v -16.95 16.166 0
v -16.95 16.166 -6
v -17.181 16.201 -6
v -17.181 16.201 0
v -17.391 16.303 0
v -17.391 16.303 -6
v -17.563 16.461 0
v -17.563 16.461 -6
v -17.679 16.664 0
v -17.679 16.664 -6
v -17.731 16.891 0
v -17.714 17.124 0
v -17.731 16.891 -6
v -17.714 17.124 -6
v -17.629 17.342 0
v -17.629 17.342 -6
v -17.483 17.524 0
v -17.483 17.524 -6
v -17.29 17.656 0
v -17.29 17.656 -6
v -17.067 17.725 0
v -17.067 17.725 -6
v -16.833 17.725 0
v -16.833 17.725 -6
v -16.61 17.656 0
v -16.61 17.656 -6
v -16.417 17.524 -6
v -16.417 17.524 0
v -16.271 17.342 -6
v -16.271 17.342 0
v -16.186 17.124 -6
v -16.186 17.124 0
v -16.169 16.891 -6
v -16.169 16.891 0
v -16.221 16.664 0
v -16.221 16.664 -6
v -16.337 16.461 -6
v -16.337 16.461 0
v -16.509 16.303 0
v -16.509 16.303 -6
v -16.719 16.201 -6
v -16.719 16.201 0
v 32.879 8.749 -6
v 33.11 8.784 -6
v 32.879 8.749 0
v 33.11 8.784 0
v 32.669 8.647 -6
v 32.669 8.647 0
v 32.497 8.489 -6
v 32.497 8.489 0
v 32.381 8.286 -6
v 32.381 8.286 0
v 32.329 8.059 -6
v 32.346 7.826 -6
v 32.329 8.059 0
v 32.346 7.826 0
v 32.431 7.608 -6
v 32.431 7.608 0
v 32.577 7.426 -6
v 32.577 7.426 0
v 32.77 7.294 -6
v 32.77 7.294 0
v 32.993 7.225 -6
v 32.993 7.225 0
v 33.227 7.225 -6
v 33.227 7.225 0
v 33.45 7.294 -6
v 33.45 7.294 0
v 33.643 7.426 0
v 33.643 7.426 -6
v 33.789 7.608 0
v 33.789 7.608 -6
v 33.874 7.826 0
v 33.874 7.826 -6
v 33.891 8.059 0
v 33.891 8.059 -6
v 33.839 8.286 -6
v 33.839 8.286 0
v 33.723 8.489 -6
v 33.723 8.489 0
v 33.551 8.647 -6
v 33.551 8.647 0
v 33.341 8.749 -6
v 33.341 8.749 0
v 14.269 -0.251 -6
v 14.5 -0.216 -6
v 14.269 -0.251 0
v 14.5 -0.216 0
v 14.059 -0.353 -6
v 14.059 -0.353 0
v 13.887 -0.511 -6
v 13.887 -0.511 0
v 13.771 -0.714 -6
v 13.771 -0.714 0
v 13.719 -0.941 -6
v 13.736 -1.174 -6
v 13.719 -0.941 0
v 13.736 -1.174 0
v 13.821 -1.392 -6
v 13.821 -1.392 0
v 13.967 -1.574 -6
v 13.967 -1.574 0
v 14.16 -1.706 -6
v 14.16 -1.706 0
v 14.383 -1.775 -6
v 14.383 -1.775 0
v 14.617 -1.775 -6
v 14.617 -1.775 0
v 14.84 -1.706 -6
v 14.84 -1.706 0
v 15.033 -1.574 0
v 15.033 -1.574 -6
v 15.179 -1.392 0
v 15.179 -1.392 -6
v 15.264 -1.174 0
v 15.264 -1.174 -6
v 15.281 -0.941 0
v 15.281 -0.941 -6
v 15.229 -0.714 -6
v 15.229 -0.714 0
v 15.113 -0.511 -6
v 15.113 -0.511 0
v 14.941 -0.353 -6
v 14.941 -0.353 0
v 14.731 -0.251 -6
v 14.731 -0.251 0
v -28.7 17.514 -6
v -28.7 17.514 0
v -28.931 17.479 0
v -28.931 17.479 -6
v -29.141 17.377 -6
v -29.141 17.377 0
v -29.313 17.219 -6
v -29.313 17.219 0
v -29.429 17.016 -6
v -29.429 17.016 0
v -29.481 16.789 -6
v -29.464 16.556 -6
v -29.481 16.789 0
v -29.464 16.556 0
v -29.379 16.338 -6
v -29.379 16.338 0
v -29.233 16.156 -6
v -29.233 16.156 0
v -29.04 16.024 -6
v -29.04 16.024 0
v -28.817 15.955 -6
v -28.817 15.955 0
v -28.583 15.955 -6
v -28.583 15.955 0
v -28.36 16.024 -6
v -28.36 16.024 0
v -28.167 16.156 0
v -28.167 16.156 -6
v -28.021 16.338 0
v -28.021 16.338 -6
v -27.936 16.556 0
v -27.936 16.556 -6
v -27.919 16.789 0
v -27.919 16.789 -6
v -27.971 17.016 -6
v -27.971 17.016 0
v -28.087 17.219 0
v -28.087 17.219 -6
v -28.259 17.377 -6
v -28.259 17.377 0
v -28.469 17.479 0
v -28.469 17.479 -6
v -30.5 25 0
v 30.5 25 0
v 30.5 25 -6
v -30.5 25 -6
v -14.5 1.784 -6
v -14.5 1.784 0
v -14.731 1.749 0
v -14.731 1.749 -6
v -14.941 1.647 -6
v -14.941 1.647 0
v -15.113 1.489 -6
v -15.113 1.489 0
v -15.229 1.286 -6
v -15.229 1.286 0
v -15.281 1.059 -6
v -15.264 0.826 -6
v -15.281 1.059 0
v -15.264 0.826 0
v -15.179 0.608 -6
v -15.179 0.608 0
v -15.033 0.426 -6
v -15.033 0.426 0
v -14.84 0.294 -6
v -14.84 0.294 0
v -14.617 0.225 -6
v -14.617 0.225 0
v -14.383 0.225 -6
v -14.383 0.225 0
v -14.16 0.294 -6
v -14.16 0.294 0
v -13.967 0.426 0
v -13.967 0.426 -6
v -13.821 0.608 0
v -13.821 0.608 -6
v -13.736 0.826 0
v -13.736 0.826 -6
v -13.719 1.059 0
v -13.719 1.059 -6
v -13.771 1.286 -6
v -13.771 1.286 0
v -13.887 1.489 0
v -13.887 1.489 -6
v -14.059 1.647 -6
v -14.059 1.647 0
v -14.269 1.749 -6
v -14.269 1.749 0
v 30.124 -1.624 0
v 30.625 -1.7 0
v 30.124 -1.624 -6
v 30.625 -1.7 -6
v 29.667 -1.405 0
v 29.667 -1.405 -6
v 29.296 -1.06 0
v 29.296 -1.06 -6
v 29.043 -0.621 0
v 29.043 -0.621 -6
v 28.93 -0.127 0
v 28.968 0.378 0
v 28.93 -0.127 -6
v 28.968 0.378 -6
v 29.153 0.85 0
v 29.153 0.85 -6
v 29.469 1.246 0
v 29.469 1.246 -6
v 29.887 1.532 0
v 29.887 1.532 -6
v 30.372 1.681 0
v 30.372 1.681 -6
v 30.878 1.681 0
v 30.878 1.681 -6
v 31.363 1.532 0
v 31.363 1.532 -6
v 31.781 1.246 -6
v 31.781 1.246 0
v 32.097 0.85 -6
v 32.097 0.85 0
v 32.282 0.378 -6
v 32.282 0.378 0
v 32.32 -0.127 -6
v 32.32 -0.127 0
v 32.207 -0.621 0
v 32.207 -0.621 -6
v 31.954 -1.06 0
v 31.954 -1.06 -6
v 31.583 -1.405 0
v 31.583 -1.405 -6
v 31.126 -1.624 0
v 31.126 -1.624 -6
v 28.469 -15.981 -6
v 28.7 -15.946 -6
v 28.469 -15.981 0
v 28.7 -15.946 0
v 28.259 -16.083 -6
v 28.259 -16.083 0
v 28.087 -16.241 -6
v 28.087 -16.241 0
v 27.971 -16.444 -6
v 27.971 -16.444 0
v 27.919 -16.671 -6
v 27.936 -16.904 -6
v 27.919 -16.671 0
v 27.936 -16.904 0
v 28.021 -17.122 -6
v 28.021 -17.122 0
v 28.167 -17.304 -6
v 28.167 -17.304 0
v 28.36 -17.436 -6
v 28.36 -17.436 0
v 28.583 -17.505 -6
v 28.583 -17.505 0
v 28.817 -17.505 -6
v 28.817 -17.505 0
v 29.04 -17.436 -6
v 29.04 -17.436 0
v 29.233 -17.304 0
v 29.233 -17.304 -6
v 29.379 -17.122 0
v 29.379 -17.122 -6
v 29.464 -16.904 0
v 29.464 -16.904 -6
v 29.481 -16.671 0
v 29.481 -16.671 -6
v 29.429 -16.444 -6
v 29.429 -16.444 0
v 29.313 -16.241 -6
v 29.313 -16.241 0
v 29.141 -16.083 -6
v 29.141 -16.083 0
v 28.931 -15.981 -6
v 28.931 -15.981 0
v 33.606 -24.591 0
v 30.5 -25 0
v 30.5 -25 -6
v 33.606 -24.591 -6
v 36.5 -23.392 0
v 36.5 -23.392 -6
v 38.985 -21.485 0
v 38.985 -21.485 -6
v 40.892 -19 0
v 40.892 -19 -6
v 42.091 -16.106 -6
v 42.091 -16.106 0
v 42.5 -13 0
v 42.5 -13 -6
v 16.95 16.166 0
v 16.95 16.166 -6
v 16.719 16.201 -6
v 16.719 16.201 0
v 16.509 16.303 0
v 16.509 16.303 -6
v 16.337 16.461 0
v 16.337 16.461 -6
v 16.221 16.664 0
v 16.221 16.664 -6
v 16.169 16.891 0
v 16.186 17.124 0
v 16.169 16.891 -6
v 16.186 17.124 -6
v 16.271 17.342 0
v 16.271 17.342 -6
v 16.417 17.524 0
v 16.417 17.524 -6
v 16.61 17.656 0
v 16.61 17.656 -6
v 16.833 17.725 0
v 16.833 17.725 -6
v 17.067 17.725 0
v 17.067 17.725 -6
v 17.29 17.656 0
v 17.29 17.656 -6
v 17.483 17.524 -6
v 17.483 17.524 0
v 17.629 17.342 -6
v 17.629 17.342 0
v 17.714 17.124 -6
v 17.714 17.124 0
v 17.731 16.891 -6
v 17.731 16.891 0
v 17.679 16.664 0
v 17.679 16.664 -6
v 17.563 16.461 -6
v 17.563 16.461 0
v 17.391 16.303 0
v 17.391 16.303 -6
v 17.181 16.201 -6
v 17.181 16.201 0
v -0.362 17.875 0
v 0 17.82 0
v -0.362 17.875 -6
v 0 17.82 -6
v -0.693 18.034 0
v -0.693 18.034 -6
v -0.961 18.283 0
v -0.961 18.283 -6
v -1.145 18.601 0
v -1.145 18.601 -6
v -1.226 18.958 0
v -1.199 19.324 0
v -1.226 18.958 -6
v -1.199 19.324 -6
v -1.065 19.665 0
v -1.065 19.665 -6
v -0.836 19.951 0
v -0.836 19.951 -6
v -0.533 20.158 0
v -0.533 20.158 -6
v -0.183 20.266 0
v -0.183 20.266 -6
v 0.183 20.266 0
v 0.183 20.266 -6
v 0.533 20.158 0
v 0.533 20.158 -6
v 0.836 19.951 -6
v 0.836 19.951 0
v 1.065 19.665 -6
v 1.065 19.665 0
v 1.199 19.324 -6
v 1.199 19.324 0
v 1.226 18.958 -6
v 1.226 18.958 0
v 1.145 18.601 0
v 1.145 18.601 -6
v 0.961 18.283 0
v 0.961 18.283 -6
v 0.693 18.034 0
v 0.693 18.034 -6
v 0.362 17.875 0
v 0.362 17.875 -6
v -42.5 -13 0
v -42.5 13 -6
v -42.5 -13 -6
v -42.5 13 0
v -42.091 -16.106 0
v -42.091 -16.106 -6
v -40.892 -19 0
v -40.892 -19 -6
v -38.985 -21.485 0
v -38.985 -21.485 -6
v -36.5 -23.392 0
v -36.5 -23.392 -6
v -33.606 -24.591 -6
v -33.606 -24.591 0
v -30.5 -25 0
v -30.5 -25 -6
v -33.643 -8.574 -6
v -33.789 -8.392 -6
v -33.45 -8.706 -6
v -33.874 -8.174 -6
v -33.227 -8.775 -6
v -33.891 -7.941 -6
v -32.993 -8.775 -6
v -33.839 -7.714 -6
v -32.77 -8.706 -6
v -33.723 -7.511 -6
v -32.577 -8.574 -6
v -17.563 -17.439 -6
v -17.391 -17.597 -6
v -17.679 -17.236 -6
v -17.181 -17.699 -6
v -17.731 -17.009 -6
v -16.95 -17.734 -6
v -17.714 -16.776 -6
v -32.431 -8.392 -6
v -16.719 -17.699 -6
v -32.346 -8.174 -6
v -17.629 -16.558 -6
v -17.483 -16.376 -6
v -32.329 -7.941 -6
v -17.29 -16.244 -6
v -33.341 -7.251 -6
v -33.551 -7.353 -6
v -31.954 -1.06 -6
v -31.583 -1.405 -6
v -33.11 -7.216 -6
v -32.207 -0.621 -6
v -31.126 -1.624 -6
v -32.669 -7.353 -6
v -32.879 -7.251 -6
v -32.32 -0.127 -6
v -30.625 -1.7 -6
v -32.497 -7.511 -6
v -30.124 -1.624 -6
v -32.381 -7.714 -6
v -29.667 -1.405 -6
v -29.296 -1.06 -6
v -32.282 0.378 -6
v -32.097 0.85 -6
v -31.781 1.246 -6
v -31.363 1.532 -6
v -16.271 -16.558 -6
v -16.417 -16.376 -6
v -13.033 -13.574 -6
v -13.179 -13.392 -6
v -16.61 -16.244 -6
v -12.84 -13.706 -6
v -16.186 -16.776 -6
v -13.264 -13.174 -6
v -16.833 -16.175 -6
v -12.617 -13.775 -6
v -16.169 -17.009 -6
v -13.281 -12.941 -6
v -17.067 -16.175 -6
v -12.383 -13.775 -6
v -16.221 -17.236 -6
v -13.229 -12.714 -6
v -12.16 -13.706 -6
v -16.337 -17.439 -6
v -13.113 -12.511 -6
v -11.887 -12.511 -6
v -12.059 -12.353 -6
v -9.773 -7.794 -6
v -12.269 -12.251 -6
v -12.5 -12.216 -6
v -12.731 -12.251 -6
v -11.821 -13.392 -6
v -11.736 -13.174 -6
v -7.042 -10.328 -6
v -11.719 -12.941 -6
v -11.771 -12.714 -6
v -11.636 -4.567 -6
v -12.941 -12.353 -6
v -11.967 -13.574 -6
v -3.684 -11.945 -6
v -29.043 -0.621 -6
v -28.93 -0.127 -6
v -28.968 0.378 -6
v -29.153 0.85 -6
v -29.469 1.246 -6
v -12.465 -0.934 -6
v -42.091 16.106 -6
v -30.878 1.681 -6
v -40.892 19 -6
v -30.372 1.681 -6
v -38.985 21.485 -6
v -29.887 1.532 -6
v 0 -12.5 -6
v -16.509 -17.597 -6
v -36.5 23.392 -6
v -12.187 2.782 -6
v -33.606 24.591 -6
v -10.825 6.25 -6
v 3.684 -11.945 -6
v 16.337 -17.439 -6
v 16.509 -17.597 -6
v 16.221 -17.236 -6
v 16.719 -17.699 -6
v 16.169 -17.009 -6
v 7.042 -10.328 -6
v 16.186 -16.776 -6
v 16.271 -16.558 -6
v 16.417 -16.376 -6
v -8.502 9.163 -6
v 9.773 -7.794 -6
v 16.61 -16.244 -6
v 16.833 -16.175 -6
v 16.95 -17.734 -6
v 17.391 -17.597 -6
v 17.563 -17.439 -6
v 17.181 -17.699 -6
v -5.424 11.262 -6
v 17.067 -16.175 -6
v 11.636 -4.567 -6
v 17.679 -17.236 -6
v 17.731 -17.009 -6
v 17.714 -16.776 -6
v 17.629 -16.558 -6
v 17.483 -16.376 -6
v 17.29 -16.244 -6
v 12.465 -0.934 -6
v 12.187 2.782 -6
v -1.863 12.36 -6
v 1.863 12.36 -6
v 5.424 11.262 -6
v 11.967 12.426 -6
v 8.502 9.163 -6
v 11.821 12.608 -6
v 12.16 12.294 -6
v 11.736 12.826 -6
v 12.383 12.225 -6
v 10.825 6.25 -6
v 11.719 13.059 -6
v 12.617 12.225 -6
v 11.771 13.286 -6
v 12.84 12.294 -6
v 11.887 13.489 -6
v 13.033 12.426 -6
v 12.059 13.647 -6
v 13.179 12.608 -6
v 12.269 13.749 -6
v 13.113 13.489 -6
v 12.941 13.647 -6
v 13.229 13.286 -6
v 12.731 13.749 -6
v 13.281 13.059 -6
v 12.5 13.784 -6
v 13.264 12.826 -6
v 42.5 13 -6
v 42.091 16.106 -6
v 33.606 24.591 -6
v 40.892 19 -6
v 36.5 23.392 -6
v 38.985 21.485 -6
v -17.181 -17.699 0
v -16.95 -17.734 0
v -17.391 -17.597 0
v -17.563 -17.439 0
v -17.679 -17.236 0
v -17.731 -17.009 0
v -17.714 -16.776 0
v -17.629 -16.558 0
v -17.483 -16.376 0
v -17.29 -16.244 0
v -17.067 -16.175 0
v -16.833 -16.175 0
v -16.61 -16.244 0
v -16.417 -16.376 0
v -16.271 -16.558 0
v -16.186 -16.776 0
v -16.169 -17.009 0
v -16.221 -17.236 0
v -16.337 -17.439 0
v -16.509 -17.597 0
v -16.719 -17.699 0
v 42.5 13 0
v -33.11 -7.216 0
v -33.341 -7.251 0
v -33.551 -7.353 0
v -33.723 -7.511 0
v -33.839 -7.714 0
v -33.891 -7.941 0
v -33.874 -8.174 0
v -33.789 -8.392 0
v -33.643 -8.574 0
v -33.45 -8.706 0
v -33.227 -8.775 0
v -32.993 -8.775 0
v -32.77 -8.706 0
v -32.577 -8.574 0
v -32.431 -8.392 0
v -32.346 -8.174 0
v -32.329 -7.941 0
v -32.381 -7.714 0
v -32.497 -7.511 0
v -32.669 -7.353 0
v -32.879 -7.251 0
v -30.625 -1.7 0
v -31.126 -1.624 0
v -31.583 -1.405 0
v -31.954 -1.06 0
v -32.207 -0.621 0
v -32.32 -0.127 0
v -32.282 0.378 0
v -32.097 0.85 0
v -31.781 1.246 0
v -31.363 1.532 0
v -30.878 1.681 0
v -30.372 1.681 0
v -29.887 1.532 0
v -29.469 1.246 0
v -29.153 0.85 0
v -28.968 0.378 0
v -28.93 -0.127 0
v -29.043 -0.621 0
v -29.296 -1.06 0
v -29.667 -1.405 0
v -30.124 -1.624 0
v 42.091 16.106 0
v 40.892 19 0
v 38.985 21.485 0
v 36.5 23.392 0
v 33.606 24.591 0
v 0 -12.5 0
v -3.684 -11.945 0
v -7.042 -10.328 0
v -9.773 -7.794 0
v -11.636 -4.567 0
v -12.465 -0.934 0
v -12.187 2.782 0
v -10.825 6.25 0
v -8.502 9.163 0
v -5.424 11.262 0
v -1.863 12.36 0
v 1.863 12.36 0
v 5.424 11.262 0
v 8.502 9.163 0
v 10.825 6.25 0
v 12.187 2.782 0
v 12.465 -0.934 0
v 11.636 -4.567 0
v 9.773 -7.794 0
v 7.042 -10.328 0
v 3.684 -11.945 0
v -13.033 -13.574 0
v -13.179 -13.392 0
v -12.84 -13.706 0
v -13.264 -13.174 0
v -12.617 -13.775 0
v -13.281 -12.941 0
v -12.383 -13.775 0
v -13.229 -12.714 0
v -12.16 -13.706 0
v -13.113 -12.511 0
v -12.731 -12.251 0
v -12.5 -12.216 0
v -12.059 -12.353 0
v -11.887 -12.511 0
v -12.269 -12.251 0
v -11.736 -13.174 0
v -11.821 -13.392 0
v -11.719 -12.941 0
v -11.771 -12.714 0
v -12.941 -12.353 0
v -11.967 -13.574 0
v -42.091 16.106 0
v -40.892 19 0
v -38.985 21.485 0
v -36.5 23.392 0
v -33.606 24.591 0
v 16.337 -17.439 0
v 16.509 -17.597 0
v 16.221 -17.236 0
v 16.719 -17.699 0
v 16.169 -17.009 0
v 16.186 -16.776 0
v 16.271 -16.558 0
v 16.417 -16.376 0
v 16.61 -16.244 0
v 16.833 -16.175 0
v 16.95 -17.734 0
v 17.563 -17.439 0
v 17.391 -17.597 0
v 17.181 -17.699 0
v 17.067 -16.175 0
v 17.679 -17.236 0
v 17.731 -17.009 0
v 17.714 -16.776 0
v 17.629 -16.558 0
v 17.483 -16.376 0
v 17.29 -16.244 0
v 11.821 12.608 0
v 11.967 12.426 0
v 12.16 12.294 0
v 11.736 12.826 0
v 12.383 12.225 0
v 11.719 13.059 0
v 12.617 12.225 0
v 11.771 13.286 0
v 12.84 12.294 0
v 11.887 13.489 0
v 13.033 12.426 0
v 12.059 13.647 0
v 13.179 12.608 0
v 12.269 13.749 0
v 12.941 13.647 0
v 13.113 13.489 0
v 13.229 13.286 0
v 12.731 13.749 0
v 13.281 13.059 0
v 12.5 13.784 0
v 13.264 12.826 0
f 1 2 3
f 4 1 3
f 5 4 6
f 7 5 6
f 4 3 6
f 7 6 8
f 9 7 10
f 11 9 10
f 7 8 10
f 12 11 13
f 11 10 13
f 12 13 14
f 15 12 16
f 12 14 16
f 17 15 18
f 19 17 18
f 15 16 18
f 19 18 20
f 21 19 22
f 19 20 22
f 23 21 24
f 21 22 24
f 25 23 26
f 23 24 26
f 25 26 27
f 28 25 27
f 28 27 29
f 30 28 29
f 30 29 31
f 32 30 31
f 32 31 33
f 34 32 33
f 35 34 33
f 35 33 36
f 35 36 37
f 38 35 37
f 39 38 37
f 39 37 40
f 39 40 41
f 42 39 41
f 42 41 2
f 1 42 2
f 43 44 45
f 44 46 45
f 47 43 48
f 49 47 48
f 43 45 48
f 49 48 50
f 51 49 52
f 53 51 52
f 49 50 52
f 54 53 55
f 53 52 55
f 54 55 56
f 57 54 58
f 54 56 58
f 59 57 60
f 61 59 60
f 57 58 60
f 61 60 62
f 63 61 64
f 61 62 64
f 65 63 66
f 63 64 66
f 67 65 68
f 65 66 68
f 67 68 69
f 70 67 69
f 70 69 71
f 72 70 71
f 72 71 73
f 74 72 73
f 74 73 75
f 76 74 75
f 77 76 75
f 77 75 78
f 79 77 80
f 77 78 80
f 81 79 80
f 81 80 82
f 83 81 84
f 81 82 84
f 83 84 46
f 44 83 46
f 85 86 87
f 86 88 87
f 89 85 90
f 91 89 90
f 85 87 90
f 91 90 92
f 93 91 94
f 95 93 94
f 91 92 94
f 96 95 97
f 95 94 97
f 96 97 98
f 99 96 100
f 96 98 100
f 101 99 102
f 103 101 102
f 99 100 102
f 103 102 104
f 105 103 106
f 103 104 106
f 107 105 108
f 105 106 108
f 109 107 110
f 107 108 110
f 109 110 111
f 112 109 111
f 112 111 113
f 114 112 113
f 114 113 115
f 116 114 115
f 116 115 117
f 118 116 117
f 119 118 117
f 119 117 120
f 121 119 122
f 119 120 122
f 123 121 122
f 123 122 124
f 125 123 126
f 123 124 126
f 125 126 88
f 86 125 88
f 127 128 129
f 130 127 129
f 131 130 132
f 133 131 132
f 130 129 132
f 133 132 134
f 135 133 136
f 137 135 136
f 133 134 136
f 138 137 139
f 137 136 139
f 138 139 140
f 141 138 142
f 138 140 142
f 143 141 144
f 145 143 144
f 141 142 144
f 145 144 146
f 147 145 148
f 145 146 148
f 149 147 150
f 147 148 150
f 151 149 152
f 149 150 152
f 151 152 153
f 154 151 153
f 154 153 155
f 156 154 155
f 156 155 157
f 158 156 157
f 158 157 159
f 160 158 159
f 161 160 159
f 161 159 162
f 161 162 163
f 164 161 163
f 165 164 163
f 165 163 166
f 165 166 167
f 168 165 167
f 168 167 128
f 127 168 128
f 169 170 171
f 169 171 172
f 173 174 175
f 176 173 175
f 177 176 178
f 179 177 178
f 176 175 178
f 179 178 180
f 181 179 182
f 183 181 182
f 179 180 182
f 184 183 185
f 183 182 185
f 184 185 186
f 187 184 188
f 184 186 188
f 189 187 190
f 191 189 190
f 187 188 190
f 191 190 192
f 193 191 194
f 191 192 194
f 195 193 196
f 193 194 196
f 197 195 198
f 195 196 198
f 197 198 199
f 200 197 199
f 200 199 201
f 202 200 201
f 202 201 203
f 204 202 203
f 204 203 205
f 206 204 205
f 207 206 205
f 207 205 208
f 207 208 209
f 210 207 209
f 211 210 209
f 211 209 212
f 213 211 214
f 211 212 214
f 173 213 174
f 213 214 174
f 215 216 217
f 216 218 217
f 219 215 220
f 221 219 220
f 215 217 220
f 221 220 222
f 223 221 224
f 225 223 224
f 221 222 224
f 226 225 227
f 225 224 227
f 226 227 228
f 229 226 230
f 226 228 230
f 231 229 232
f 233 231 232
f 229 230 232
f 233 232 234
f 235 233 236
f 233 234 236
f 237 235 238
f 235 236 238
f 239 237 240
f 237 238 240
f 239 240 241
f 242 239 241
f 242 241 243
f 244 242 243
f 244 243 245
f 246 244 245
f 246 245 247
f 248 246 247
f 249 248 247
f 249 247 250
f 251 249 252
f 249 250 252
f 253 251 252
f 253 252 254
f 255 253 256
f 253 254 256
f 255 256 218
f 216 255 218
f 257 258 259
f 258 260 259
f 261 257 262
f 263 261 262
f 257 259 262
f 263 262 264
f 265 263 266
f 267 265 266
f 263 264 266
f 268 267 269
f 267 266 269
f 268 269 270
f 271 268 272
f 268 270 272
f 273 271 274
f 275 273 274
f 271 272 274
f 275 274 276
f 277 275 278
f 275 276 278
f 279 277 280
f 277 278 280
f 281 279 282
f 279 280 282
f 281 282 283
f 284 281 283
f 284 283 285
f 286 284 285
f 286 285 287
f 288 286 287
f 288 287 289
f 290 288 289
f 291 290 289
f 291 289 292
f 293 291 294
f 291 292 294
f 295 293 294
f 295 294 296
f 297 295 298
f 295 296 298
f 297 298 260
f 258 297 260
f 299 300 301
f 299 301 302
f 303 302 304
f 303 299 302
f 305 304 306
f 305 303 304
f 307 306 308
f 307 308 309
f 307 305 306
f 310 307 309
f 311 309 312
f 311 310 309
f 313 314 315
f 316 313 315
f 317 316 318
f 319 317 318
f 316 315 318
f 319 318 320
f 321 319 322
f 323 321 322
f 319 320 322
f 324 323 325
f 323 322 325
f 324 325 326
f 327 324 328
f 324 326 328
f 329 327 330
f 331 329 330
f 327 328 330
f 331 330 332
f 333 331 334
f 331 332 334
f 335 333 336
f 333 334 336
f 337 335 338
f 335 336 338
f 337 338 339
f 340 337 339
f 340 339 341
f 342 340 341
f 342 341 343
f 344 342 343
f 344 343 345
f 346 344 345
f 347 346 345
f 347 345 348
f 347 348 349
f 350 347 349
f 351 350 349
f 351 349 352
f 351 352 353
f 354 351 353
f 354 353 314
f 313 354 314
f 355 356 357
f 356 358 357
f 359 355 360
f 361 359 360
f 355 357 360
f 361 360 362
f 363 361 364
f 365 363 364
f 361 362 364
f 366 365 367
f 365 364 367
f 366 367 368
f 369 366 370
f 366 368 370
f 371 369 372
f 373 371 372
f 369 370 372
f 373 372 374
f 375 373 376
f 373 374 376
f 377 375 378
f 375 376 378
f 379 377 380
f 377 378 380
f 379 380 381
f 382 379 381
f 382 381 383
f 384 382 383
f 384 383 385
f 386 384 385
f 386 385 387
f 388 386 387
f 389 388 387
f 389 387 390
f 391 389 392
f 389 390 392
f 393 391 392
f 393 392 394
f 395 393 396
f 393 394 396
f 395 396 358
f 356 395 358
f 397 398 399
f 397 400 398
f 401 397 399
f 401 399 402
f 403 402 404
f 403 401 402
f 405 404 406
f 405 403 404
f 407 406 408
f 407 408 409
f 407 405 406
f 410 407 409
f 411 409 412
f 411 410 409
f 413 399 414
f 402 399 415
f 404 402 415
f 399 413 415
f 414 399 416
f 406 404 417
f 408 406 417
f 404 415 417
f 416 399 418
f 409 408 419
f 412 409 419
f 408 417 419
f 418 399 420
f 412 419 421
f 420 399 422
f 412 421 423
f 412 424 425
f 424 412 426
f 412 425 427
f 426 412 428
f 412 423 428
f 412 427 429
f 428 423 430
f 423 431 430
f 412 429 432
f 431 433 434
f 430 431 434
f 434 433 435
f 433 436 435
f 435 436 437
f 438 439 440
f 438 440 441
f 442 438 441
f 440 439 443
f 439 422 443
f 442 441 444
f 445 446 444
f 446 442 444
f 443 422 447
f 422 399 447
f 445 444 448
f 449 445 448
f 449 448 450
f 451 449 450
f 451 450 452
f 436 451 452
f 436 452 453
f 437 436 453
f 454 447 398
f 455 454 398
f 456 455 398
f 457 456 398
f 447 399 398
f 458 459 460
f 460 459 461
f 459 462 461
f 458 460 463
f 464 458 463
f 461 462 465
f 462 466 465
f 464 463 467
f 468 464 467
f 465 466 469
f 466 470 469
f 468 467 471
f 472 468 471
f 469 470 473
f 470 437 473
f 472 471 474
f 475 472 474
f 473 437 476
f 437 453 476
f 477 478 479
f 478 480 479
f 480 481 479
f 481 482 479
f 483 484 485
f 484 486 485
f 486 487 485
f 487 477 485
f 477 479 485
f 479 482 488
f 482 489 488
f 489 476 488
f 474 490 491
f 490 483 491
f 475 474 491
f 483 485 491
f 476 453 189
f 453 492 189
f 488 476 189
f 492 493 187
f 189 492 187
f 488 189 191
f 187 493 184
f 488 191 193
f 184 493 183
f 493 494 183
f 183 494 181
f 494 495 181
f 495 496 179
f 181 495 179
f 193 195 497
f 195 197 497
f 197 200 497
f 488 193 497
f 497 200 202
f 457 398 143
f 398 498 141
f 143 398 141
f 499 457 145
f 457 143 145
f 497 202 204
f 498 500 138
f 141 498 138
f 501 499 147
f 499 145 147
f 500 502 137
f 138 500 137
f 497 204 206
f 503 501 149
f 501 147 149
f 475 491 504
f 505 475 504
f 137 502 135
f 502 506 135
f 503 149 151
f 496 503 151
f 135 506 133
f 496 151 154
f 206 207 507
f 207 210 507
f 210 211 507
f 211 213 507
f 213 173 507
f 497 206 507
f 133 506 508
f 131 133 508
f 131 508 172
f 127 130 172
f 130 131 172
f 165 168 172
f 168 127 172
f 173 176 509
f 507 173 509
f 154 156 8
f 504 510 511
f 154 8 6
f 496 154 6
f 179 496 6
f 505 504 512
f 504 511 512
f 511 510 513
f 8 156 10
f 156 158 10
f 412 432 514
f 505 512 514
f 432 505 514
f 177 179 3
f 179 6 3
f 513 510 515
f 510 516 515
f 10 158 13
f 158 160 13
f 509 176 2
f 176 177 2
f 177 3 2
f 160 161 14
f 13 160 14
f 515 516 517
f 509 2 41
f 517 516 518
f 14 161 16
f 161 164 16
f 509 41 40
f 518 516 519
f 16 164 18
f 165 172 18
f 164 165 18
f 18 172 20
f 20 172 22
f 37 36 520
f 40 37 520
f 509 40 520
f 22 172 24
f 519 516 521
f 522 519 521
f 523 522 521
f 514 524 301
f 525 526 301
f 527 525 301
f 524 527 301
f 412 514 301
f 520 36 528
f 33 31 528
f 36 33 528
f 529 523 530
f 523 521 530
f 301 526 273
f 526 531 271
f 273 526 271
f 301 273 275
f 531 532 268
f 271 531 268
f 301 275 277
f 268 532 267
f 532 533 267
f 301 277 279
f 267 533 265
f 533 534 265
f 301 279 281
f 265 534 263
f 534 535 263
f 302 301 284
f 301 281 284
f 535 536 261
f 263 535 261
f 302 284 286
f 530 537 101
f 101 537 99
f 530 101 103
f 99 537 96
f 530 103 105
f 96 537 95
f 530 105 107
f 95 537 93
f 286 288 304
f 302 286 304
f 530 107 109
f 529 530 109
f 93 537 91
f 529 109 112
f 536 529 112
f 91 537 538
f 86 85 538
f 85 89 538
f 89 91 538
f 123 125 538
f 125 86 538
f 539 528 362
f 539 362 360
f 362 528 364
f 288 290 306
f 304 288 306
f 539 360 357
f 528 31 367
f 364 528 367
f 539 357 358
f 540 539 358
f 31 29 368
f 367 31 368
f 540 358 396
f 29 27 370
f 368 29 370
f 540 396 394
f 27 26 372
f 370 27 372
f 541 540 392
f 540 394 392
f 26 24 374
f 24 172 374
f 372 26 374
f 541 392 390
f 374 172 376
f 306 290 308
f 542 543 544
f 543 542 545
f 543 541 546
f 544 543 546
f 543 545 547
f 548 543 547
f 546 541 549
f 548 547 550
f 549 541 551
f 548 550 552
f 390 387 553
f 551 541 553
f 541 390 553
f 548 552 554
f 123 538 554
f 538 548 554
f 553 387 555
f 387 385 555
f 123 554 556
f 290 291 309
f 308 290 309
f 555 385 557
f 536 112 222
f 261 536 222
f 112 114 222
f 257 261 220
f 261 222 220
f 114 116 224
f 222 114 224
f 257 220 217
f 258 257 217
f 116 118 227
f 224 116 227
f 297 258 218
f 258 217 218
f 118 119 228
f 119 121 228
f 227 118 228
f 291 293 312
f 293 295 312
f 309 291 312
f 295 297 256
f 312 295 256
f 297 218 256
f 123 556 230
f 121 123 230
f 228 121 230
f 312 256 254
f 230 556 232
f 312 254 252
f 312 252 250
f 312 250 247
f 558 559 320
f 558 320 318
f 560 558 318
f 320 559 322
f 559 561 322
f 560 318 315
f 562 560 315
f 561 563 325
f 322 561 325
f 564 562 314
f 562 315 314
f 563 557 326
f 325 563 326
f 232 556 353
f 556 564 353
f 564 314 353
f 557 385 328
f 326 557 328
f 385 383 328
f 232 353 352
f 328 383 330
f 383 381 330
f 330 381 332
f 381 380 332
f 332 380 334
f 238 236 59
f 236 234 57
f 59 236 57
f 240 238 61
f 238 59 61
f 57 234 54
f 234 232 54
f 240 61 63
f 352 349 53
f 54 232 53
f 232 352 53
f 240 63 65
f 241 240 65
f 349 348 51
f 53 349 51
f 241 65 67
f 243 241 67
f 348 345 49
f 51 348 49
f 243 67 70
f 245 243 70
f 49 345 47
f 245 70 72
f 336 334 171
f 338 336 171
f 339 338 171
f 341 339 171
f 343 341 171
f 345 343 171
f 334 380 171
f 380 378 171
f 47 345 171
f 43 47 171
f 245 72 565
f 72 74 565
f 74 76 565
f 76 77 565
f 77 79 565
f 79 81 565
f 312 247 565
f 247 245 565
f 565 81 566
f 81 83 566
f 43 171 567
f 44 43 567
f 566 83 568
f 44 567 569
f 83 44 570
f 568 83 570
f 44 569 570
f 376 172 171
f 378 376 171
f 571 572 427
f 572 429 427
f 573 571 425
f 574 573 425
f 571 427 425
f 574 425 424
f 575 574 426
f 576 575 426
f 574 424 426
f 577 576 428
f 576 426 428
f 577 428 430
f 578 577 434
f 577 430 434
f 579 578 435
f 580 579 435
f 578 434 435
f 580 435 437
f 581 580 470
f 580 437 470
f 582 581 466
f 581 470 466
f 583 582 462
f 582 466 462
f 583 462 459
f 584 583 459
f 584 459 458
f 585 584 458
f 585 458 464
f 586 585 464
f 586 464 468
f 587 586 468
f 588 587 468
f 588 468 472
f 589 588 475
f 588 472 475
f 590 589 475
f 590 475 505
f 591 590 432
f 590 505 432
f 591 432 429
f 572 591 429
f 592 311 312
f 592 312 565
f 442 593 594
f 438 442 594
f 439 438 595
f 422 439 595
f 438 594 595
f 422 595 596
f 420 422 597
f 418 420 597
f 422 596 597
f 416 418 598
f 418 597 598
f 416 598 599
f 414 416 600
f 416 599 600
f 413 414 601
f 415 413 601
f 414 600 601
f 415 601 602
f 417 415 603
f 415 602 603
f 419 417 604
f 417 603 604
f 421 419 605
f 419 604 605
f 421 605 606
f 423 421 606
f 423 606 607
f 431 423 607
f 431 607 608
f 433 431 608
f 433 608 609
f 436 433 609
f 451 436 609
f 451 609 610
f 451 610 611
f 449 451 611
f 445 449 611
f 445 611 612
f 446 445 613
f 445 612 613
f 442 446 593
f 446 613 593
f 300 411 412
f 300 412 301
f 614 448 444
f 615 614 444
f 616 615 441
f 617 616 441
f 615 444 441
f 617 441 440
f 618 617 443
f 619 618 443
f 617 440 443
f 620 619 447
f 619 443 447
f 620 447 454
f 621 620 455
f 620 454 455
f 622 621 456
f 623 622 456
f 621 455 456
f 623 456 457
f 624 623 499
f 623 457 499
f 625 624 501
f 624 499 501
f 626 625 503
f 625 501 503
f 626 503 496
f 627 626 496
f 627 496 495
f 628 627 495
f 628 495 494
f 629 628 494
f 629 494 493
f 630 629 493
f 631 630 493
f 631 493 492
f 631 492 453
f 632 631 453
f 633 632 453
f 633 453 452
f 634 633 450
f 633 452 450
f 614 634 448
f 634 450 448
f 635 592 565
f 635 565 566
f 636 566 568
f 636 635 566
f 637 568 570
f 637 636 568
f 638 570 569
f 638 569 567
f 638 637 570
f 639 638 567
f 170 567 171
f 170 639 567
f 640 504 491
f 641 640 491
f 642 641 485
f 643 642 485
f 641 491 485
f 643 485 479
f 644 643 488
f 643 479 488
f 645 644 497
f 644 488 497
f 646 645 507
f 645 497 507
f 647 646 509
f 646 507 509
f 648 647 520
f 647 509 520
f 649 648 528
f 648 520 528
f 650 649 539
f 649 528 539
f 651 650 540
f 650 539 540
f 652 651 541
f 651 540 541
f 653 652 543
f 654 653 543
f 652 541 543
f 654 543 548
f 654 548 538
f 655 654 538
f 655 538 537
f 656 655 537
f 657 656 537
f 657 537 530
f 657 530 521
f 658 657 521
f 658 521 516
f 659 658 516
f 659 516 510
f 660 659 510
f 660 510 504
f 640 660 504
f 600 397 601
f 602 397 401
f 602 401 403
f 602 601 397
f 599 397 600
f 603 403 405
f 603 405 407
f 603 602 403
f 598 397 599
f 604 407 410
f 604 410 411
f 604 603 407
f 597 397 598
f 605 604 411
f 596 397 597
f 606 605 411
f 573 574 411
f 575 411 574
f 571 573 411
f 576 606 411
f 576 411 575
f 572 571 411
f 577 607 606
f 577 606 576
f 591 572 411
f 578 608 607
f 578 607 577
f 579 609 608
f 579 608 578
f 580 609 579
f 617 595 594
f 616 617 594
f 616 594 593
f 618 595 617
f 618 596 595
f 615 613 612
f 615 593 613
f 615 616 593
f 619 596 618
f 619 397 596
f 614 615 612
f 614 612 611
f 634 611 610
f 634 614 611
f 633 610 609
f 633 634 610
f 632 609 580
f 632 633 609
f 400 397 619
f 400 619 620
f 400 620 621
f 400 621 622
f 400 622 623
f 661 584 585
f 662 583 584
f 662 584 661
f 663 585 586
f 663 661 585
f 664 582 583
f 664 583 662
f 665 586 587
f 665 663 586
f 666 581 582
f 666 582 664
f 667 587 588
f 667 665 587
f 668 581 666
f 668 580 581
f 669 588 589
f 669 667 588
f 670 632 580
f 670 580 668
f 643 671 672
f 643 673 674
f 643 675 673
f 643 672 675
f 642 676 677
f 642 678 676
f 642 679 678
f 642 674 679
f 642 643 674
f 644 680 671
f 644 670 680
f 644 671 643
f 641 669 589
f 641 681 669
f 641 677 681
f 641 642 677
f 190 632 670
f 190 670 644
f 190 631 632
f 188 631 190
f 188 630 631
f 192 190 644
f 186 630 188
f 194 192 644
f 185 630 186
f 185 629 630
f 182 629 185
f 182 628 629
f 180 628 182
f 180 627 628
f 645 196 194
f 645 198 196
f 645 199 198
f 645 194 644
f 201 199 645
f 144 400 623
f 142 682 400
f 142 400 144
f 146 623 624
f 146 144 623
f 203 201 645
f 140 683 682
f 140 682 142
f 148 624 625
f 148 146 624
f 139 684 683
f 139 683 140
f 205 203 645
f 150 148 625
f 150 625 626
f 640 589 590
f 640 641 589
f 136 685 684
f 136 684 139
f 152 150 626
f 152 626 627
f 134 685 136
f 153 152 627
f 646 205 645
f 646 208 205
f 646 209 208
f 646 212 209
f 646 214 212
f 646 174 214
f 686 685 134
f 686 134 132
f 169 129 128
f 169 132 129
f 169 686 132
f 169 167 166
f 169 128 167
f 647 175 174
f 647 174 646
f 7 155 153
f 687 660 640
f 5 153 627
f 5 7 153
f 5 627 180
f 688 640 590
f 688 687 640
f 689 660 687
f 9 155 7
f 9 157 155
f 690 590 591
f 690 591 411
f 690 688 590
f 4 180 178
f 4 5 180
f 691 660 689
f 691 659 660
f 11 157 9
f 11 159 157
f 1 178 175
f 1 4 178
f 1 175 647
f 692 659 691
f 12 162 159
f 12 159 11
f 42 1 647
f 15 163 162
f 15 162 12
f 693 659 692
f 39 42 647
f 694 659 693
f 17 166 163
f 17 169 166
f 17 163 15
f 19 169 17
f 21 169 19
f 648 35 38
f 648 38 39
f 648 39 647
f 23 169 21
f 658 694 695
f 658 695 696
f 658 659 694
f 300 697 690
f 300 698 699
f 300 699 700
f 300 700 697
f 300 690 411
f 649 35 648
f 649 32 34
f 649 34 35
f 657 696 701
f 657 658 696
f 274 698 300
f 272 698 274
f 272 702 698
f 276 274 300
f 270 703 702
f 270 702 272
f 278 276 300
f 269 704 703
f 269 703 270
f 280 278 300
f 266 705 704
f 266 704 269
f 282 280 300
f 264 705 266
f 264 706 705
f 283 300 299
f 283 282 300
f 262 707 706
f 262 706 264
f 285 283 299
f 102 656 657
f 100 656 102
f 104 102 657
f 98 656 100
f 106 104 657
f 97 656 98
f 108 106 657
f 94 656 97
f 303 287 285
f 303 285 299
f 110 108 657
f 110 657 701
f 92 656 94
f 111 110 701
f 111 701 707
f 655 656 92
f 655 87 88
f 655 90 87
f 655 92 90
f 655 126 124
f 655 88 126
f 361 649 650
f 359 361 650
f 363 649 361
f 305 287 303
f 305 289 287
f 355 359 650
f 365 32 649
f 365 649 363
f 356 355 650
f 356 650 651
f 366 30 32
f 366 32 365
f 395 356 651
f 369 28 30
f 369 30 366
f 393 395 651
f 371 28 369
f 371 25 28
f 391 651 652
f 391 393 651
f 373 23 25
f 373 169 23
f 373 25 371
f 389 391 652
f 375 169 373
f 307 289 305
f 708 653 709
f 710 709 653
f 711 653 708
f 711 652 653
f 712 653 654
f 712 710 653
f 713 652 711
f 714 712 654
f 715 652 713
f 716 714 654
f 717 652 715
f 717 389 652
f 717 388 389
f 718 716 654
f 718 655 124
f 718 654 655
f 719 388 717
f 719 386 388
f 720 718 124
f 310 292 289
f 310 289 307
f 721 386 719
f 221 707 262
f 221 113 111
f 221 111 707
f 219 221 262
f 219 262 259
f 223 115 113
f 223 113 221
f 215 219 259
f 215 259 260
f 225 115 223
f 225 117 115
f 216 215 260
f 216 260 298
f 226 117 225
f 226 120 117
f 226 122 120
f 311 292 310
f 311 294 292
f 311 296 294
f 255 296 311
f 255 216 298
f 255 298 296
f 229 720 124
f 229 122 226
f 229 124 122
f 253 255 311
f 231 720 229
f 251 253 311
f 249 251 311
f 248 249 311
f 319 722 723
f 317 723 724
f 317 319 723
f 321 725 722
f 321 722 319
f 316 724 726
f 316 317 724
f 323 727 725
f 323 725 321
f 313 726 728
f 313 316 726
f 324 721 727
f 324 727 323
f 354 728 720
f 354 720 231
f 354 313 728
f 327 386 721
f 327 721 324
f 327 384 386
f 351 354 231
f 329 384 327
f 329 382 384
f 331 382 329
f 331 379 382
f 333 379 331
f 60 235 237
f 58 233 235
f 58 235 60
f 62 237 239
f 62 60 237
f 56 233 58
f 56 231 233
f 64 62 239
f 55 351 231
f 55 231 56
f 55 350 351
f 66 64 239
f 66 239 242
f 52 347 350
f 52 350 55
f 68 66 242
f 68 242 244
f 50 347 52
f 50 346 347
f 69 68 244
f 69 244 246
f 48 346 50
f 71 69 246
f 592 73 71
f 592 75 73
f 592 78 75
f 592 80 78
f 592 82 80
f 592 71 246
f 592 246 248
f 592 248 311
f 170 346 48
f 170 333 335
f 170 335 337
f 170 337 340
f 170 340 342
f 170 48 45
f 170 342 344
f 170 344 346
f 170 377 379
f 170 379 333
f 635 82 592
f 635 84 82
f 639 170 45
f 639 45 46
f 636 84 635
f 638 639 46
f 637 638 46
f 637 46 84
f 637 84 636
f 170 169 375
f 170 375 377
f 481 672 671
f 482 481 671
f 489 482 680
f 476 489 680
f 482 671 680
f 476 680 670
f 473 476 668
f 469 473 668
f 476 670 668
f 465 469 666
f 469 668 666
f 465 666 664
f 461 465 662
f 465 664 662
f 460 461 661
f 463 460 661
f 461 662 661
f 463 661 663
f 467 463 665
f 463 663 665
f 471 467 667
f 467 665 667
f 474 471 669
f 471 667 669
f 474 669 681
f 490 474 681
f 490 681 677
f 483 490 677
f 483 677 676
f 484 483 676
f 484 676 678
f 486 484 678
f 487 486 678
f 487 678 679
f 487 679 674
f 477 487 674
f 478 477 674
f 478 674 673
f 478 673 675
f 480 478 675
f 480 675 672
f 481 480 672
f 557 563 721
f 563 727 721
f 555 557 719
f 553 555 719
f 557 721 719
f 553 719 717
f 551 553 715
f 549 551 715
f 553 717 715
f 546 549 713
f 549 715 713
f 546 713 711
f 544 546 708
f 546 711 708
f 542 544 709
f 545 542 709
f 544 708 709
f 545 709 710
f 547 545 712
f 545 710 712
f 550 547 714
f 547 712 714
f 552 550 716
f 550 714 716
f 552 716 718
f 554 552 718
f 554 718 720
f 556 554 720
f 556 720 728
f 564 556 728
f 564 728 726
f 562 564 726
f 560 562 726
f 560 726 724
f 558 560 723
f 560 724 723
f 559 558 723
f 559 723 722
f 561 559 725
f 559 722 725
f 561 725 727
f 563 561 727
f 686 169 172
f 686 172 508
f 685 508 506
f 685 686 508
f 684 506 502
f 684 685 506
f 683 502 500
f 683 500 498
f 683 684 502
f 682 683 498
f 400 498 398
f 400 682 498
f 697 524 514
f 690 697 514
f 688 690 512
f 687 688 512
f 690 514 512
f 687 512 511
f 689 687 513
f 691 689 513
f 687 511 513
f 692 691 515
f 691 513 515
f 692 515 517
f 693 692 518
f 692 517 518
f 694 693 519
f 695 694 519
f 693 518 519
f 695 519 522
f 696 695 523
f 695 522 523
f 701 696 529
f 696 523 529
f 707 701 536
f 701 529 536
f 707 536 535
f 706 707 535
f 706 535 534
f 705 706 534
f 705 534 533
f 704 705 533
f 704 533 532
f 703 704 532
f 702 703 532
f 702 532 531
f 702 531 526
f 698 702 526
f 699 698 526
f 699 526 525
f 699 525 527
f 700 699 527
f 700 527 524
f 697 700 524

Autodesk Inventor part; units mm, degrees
ref_plane "YZ Plane" through (0, 0, 0) normal (1, 0, 0) x (0, 1, 0)
ref_plane "XZ Plane" through (0, 0, 0) normal (0, 1, 0) x (-1, 0, 0)
ref_plane "XY Plane" through (0, 0, 0) normal (0, 0, 1) x (1, 0, 0)
sketch "Sketch1" plane through (0, 0, 0) normal (0, 0, 1) x (1, 0, 0)
  line L0 (-30.5, -25) -> (30.5, -25)
  line L1 (42.5, -13) -> (42.5, 13)
  line L2 (30.5, 25) -> (-30.5, 25)
  line L3 (-42.5, 13) -> (-42.5, -13)
  line L4 (-42.5, -25) -> (42.5, 25) construction
  line L5 (42.5, -25) -> (-42.5, 25) construction
  arc A0 (-30.5, 25) -> (-42.5, 13) centre (-30.5, 13) ccw
  arc A1 (-42.5, -13) -> (-30.5, -25) centre (-30.5, -13) ccw
  arc A2 (30.5, -25) -> (42.5, -13) centre (30.5, -13) ccw
  arc A3 (42.5, 13) -> (30.5, 25) centre (30.5, 13) ccw
  line L6 (-19.05, -19.05) -> (19.05, -19.05)
  line L7 (19.05, -19.05) -> (19.05, 19.05)
  line L8 (19.05, 19.05) -> (-19.05, 19.05)
  line L9 (-19.05, 19.05) -> (-19.05, -19.05)
  line L10 (-19.05, -19.05) -> (19.05, 19.05) construction
  line L11 (19.05, -19.05) -> (-19.05, 19.05) construction
  circle A4 centre (0, 0) radius 12.5
  line L12 (-19.05, 19.05) -> (-16.95, 19.05)
  line L13 (-16.95, 19.05) -> (-16.95, 16.95)
  circle A5 centre (-16.95, 16.95) radius 2.25
  line L14 (19.05, 19.05) -> (16.95, 19.05)
  line L15 (16.95, 19.05) -> (16.95, 16.95)
  line L16 (-19.05, -19.05) -> (-16.95, -19.05)
  line L17 (-16.95, -19.05) -> (-16.95, -16.95)
  line L18 (19.05, -19.05) -> (16.95, -19.05)
  line L19 (16.95, -19.05) -> (16.95, -16.95)
  circle A6 centre (16.95, 16.95) radius 2.25
  circle A7 centre (-16.95, -16.95) radius 2.25
  circle A8 centre (16.95, -16.95) radius 2.25
  line L20 (0, 0) -> (30.625, 0)
  line L21 (0, 0) -> (-30.625, 0)
  circle A9 centre (-30.625, 0) radius 3.2
  circle A10 centre (30.625, 0) radius 3.2
  circle A11 centre (0, 19.05) radius 2.85
  dimension "d0" = 85
  dimension "d1" = 50
  dimension "d2" = 12
  dimension "d3" = 38.1
  dimension "d4" = 38.1
  dimension "d5" = 25
  dimension "d6" = 2.1
  dimension "d7" = 2.1
  dimension "d8" = 4.5
  dimension "d9" = 2.1
  dimension "d10" = 2.1
  dimension "d11" = 2.1
  dimension "d12" = 2.1
  dimension "d13" = 2.1
  dimension "d14" = 2.1
  dimension "d15" = 4.5
  dimension "d16" = 4.5
  dimension "d17" = 4.5
  dimension "d18" = 30.625
  dimension "d19" = 30.625
  dimension "d20" = 6.4
  dimension "d21" = 6.4
  dimension "d22" = 5.7
extrude "Extrusion1" add sketch "Sketch1" against normal blind 6 contours A1 L3 A0 L2 A3 L1 A2 L0 | L9 A7 L6 | A9 | A10 | A7 L9 L6 | L6 A7 | A7 L9 | A7 L9 L21 A4 L20 L7 A8 L6 | A8 L7 L6 | L6 A8 | L9 A5 L8 A11 A6 L7 L20 A4 L21 | A8 L7 | A8 L7 L6 | A5 L9 | L9 A5 L8 | L21 L20 A4 | A4 L20 L21 | L9 L8 A5 | A6 L8 L7 | L7 A6 | A5 L8 | A6 L8 L7 | A6 L8 | A11 L8 | L8 A11
hole "Hole1" at (-30.625, 0, 0) at (30.625, 0, 0) direction (0, 0, -1) diameter 3.4 end through all clearance for "Flat Head Machine Screw" size "M3" standard "Ansi Metric M Profile"
hole "Hole2" at (0, 19.05, 0) direction (0, 0, -1) diameter 2.459 end through all thread size "M3x0.5" class "6H" standard "ISO Metric profile"
hole "Hole3" at (-16.95, 16.95, 0) at (16.95, 16.95, 0) at (16.95, -16.95, 0) at (-16.95, -16.95, 0) direction (0, 0, -1) diameter 1.567 end through all thread size "M2x0.4" class "6H" standard "ISO Metric profile"
hole "Hole4" at (0, 0, 0) direction (0, 0, -1) diameter 25 end through all
sketch "Sketch2" plane through (0, 0, -6) normal (0, 0, -1) x (-1, 0, 0)
  line L0 (42.5, 25) -> (14.5, 25)
  line L1 (14.5, 25) -> (14.5, 1)
  line L2 (42.5, 25) -> (42.5, 16.73)
  line L3 (42.5, 16.73) -> (28.7, 16.73)
  line L4 (-42.5, -25) -> (-42.5, -16.73)
  line L5 (-42.5, -16.73) -> (-28.7, -16.73)
  line L6 (-42.5, -25) -> (-14.5, -25)
  line L7 (30.5, -25) -> (-30.5, -25) projected
  line L8 (-14.5, -25) -> (-14.5, -1)
  line L9 (-42.5, 25) -> (-12.5, 25)
  line L10 (-12.5, 25) -> (-12.5, 13)
  line L11 (42.5, -25) -> (12.5, -25)
  line L12 (12.5, -25) -> (12.5, -13)
  line L13 (-42.5, 25) -> (-42.5, 8)
  line L14 (-42.5, 8) -> (-33.11, 8)
  line L15 (42.5, -25) -> (42.5, -8)
  line L16 (42.5, -8) -> (33.11, -8)
  point P0 (0, 0)
  dimension "d53" = 28
  dimension "d54" = 24
  dimension "d55" = 8.27
  dimension "d56" = 13.8
  dimension "d57" = 8.27
  dimension "d58" = 13.8
  dimension "d59" = 28
  dimension "d60" = 24
  dimension "d61" = 30
  dimension "d62" = 12
  dimension "d63" = 30
  dimension "d64" = 12
  dimension "d65" = 17
  dimension "d66" = 9.39
  dimension "d67" = 17
  dimension "d68" = 9.39
hole "Hole5" at (33.11, 8, -6) at (12.5, 13, -6) at (-28.7, 16.73, -6) at (-14.5, 1, -6) at (-33.11, -8, -6) at (-12.5, -13, -6) at (14.5, -1, -6) at (28.7, -16.73, -6) direction (0, 0, 1) diameter 1.567 end through all thread size "M2x0.4" class "6H" standard "ISO Metric profile"
properties part number "new-adapter-plate"
